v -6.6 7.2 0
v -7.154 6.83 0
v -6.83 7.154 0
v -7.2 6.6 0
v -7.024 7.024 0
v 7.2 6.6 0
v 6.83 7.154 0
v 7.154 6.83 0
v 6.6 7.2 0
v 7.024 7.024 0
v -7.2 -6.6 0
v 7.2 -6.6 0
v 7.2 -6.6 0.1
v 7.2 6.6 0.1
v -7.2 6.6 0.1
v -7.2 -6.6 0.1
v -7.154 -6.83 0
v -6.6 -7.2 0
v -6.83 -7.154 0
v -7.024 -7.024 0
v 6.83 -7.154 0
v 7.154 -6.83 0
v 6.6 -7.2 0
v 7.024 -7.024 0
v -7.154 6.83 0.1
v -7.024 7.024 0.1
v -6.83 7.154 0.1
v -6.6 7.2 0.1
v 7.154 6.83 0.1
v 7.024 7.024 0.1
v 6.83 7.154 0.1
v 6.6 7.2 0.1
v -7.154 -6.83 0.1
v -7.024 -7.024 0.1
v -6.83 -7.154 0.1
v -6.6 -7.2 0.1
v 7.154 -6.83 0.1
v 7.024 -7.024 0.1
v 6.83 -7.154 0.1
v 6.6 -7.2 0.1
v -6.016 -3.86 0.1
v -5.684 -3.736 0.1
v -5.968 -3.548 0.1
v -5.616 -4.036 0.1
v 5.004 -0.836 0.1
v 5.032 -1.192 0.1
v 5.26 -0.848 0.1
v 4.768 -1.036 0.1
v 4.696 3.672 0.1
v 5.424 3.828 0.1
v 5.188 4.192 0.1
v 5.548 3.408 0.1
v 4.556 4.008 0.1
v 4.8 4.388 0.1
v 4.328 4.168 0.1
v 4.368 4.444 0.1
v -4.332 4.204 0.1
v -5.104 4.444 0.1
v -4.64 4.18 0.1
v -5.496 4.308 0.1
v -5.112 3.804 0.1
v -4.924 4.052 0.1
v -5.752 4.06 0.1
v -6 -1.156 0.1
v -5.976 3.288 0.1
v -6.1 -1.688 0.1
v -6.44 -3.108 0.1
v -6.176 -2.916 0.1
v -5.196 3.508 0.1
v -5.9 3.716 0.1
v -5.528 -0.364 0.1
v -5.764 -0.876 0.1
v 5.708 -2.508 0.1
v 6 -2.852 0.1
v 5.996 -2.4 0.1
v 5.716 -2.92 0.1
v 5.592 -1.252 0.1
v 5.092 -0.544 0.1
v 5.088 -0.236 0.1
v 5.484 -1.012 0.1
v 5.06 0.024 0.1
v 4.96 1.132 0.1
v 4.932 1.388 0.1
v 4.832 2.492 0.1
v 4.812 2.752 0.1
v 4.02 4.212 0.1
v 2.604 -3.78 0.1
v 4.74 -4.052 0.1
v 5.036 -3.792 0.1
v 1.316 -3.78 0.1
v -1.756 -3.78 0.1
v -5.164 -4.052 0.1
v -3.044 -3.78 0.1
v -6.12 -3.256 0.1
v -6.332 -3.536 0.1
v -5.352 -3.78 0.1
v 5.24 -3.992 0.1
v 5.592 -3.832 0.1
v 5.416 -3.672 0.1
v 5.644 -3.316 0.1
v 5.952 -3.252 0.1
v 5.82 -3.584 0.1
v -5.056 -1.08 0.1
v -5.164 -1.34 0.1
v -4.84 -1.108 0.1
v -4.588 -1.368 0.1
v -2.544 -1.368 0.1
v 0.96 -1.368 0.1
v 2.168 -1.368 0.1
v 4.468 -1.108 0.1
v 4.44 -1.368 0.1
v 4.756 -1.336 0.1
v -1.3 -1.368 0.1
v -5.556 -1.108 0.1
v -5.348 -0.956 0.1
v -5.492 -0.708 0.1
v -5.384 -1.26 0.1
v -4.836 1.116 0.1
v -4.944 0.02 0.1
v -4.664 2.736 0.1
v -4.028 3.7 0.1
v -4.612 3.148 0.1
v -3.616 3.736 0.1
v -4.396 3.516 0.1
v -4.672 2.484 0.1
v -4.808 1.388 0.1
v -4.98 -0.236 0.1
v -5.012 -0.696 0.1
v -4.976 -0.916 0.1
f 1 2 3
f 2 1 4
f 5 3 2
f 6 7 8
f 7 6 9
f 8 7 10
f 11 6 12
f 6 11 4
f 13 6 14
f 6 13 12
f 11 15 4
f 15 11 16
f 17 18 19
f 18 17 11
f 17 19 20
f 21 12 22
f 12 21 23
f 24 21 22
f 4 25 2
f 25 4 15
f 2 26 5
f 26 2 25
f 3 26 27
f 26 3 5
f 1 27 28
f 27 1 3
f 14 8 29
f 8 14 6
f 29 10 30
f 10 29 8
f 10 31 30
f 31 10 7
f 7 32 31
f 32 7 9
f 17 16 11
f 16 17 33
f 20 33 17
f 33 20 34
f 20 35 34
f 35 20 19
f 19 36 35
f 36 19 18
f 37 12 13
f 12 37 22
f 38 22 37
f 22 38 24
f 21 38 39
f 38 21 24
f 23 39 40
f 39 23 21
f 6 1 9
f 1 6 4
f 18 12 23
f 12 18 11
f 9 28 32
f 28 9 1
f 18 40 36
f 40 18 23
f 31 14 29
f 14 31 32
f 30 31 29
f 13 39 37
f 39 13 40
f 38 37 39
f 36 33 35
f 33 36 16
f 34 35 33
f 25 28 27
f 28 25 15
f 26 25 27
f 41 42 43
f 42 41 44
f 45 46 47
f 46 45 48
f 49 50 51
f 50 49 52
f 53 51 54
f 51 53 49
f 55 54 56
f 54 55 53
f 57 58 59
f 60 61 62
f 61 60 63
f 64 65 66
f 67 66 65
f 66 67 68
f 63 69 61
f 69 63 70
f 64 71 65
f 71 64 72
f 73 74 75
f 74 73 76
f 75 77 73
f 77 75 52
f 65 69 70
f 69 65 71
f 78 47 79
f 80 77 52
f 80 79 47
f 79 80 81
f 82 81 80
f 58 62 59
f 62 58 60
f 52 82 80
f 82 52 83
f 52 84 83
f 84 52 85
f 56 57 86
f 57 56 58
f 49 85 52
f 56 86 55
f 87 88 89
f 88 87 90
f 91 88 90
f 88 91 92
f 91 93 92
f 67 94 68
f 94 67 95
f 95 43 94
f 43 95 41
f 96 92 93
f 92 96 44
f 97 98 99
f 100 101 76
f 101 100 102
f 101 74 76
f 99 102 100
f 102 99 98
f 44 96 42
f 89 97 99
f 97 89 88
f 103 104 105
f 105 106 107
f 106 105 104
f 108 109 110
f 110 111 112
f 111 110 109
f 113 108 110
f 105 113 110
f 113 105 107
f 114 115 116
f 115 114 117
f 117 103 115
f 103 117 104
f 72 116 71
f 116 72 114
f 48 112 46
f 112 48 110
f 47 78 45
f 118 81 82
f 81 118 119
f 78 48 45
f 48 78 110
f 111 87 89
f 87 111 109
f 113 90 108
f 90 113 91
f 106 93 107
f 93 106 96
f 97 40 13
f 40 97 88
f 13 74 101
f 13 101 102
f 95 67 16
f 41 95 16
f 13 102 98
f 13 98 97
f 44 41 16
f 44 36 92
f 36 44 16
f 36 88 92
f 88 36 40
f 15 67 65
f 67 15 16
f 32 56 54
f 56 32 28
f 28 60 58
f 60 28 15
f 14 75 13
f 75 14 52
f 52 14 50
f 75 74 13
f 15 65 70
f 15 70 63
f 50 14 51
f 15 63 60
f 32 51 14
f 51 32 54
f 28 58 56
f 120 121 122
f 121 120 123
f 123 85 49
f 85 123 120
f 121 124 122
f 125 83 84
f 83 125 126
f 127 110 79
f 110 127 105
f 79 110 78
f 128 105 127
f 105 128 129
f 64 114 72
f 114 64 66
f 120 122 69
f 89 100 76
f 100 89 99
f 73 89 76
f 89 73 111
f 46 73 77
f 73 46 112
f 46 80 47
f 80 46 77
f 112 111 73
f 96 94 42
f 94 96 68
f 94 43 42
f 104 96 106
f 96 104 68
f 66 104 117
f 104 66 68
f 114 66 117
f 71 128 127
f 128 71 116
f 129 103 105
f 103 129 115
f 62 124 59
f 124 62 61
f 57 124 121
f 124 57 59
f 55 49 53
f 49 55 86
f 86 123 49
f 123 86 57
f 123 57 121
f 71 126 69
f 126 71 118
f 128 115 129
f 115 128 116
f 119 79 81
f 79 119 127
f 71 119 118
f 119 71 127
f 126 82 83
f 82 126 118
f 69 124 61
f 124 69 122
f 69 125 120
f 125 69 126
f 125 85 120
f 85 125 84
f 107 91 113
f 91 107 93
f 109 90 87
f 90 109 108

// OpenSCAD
// file: ../p/box3u12.scad
use <../lib.scad>
function ldraw_lib__box3u12() = [
// 0 Box with 3 Parallel Faces without Any Edges
// 0 Name: box3u12.dat
// 0 Author: J.C. Tchang [tchang]
// 0 !LDRAW_ORG Primitive UPDATE 2014-02
// 0 !LICENSE Licensed under CC BY 4.0 : see CAreadme.txt
// 
// 0 BFC CERTIFY CCW
  [0,"BFC","CERTIFY"],
  [0,"BFC","CCW"],
// 
// 0 !HISTORY 2014-12-23 [PTadmin] Official Update 2014-02
// 
// 
// 4 16 -1 1 1 1 1 1 1 1 -1 -1 1 -1
  [4,16,-1,1,1,1,1,1,1,1,-1,-1,1,-1],
// 4 16 -1 1 1 -1 0 1 1 0 1 1 1 1
  [4,16,-1,1,1,-1,0,1,1,0,1,1,1,1],
// 4 16 1 1 -1 1 0 -1 -1 0 -1 -1 1 -1
  [4,16,1,1,-1,1,0,-1,-1,0,-1,-1,1,-1],
];
module ldraw_lib__box3u12(step=0, col=false, unit=2/5, alt=false, line=0.2, solid=!$preview)
    makepoly(ldraw_lib__box3u12(), step=step, col=col, unit=unit, alt=alt, line=line, solid=solid);
ldraw_lib__box3u12(line=0.2);
// file: ../p/1-4cyli.scad
use <../lib.scad>
function ldraw_lib__1_4cyli() = [
// 0 Cylinder 0.25
// 0 Name: 1-4cyli.dat
// 0 Author: James Jessiman
// 0 !LDRAW_ORG Primitive UPDATE 2012-01
// 0 !LICENSE Licensed under CC BY 4.0 : see CAreadme.txt
// 
// 0 BFC CERTIFY CCW
  [0,"BFC","CERTIFY"],
  [0,"BFC","CCW"],
// 
// 0 !HISTORY 2002-03-23 [sbliss] Added BFC statement.
// 0 !HISTORY 2002-04-25 [PTadmin] Official Update 2002-02
// 0 !HISTORY 2007-06-22 [PTadmin] Header formatted for Contributor Agreement
// 0 !HISTORY 2008-07-01 [PTadmin] Official Update 2008-01
// 0 !HISTORY 2012-02-16 [Philo] Changed to CCW
// 0 !HISTORY 2012-03-30 [PTadmin] Official Update 2012-01
// 
// 
// 4 16 1 1 0 0.9239 1 0.3827 0.9239 0 0.3827 1 0 0
  [4,16,1,1,0,0.9239,1,0.3827,0.9239,0,0.3827,1,0,0],
// 5 24 1 0 0 1 1 0 0.9239 0 0.3827 1 0 -1
  [5,24,1,0,0,1,1,0,0.9239,0,0.3827,1,0,-1],
// 4 16 0.9239 1 0.3827 0.7071 1 0.7071 0.7071 0 0.7071 0.9239 0 0.3827
  [4,16,0.9239,1,0.3827,0.7071,1,0.7071,0.7071,0,0.7071,0.9239,0,0.3827],
// 5 24 0.9239 0 0.3827 0.9239 1 0.3827 0.7071 0 0.7071 1 0 0
  [5,24,0.9239,0,0.3827,0.9239,1,0.3827,0.7071,0,0.7071,1,0,0],
// 4 16 0.7071 1 0.7071 0.3827 1 0.9239 0.3827 0 0.9239 0.7071 0 0.7071
  [4,16,0.7071,1,0.7071,0.3827,1,0.9239,0.3827,0,0.9239,0.7071,0,0.7071],
// 5 24 0.7071 0 0.7071 0.7071 1 0.7071 0.3827 0 0.9239 0.9239 0 0.3827
  [5,24,0.7071,0,0.7071,0.7071,1,0.7071,0.3827,0,0.9239,0.9239,0,0.3827],
// 4 16 0.3827 1 0.9239 0 1 1 0 0 1 0.3827 0 0.9239
  [4,16,0.3827,1,0.9239,0,1,1,0,0,1,0.3827,0,0.9239],
// 5 24 0.3827 0 0.9239 0.3827 1 0.9239 0 0 1 0.7071 0 0.7071
  [5,24,0.3827,0,0.9239,0.3827,1,0.9239,0,0,1,0.7071,0,0.7071],
// 5 24 0 0 1 0 1 1 0.3827 0 0.9239 -1 0 1
  [5,24,0,0,1,0,1,1,0.3827,0,0.9239,-1,0,1],
];
module ldraw_lib__1_4cyli(step=0, col=false, unit=2/5, alt=false, line=0.2, solid=!$preview)
    makepoly(ldraw_lib__1_4cyli(), step=step, col=col, unit=unit, alt=alt, line=line, solid=solid);
ldraw_lib__1_4cyli(line=0.2);
// file: s/stickerback018x018.scad
use <../../lib.scad>
use <../../p/1-4chrd.scad>
use <../../p/1-4cyli.scad>
use <../../p/box3u12.scad>
function ldraw_lib__s__stickerback018x018() = [
// 0 ~Sticker Back  1.8 x  1.8
// 0 Name: s\stickerback018x018.dat
// 0 Author: Massimo Maso [Sirio]
// 0 !LDRAW_ORG Subpart UPDATE 2025-08
// 0 !LICENSE Licensed under CC BY 4.0 : see CAreadme.txt
// 
// 0 BFC CERTIFY CCW
  [0,"BFC","CERTIFY"],
  [0,"BFC","CCW"],
// 
// 0 !HISTORY 2025-08-31 [OrionP] Official Update 2025-08
// 
// 0 // Primitives
// 1 16 -16.5 0 16.5 -1.5 0 0 0 -1 0 0 0 1.5 1-4chrd.dat
  [1,16,-16.5,0,16.5,-1.5,0,0,0,-1,0,0,0,1.5, ldraw_lib__1_4chrd()],
// 1 16 16.5 0 16.5 1.5 0 0 0 -1 0 0 0 1.5 1-4chrd.dat
  [1,16,16.5,0,16.5,1.5,0,0,0,-1,0,0,0,1.5, ldraw_lib__1_4chrd()],
// 1 16 0 -.25 0 0 0 18 0 .25 0 16.5 0 0 box3u12.dat
  [1,16,0,-.25,0,0,0,18,0,.25,0,16.5,0,0, ldraw_lib__box3u12()],
// 1 16 -16.5 0 -16.5 -1.5 0 0 0 -1 0 0 0 -1.5 1-4chrd.dat
  [1,16,-16.5,0,-16.5,-1.5,0,0,0,-1,0,0,0,-1.5, ldraw_lib__1_4chrd()],
// 1 16 16.5 0 -16.5 1.5 0 0 0 -1 0 0 0 -1.5 1-4chrd.dat
  [1,16,16.5,0,-16.5,1.5,0,0,0,-1,0,0,0,-1.5, ldraw_lib__1_4chrd()],
// 1 16 -16.5 -.25 16.5 -1.5 0 0 0 .25 0 0 0 1.5 1-4cyli.dat
  [1,16,-16.5,-.25,16.5,-1.5,0,0,0,.25,0,0,0,1.5, ldraw_lib__1_4cyli()],
// 1 16 16.5 -.25 16.5 1.5 0 0 0 .25 0 0 0 1.5 1-4cyli.dat
  [1,16,16.5,-.25,16.5,1.5,0,0,0,.25,0,0,0,1.5, ldraw_lib__1_4cyli()],
// 1 16 -16.5 -.25 -16.5 -1.5 0 0 0 .25 0 0 0 -1.5 1-4cyli.dat
  [1,16,-16.5,-.25,-16.5,-1.5,0,0,0,.25,0,0,0,-1.5, ldraw_lib__1_4cyli()],
// 1 16 16.5 -.25 -16.5 1.5 0 0 0 .25 0 0 0 -1.5 1-4cyli.dat
  [1,16,16.5,-.25,-16.5,1.5,0,0,0,.25,0,0,0,-1.5, ldraw_lib__1_4cyli()],
// 0 // Bottom face
// 4 16 -16.5 0 18 16.5 0 18 18 0 16.5 -18 0 16.5
  [4,16,-16.5,0,18,16.5,0,18,18,0,16.5,-18,0,16.5],
// 4 16 -16.5 0 -18 -18 0 -16.5 18 0 -16.5 16.5 0 -18
  [4,16,-16.5,0,-18,-18,0,-16.5,18,0,-16.5,16.5,0,-18],
// 0 // Lateral face
// 4 16 -16.5 -.25 18 16.5 -.25 18 16.5 0 18 -16.5 0 18
  [4,16,-16.5,-.25,18,16.5,-.25,18,16.5,0,18,-16.5,0,18],
// 4 16 16.5 0 -18 16.5 -.25 -18 -16.5 -.25 -18 -16.5 0 -18
  [4,16,16.5,0,-18,16.5,-.25,-18,-16.5,-.25,-18,-16.5,0,-18],
];
module ldraw_lib__s__stickerback018x018(step=0, col=false, unit=2/5, alt=false, line=0.2, solid=!$preview)
    makepoly(ldraw_lib__s__stickerback018x018(), step=step, col=col, unit=unit, alt=alt, line=line, solid=solid);
ldraw_lib__s__stickerback018x018(line=0.2);
// file: ../p/1-4chrd.scad
use <../lib.scad>
function ldraw_lib__1_4chrd() = [
// 0 Chord 0.25
// 0 Name: 1-4chrd.dat
// 0 Author: Max Martin Richter [MMR1988]
// 0 !LDRAW_ORG Primitive UPDATE 2023-05
// 0 !LICENSE Licensed under CC BY 4.0 : see CAreadme.txt
// 
// 0 BFC CERTIFY CCW
  [0,"BFC","CERTIFY"],
  [0,"BFC","CCW"],
// 
// 0 !HISTORY 2004-04-22 [PTadmin] Official Update 2004-02
// 0 !HISTORY 2007-10-09 [PTadmin] Header formatted for Contributor Agreement
// 0 !HISTORY 2008-07-01 [PTadmin] Official Update 2008-01
// 0 !HISTORY 2012-08-02 [MMR1988] Re-creation with PrimGen2 and Rectifier
// 0 !HISTORY 2012-08-09 [PTadmin] Official Update 2012-02
// 0 !HISTORY 2023-10-27 [OrionP] Change author to MMR1988 from hafhead
// 0 !HISTORY 2023-10-31 [OrionP] Official Update 2023-05
// 
// 4 16 0.9239 0 0.3827 0.3827 0 0.9239 0 0 1 1 0 0
  [4,16,0.9239,0,0.3827,0.3827,0,0.9239,0,0,1,1,0,0],
// 3 16 0.7071 0 0.7071 0.3827 0 0.9239 0.9239 0 0.3827
  [3,16,0.7071,0,0.7071,0.3827,0,0.9239,0.9239,0,0.3827],
];
module ldraw_lib__1_4chrd(step=0, col=false, unit=2/5, alt=false, line=0.2, solid=!$preview)
    makepoly(ldraw_lib__1_4chrd(), step=step, col=col, unit=unit, alt=alt, line=line, solid=solid);
ldraw_lib__1_4chrd(line=0.2);
// main file
use <../lib.scad>
use <../p/1-4chrd.scad>
use <s/stickerback018x018.scad>
function ldraw_lib__6531941b() = [
// 0 Sticker  1.8 x  1.8 with Wide Shuttle Bay
// 0 Name: 6531941b.dat
// 0 Author: Philippe Hurbain [Philo]
// 0 !LDRAW_ORG Part UPDATE 2026-07
// 0 !LICENSE Licensed under CC BY 4.0 : see CAreadme.txt
// 
// 0 BFC CERTIFY CCW
  [0,"BFC","CERTIFY"],
  [0,"BFC","CCW"],
// 
// 0 !CATEGORY Sticker
// 0 !KEYWORDS Bricklink 10356stk01a, Brickowl 985574, Rebrickable 10111843
// 0 !KEYWORDS Set 10356, Star Trek, U.S.S. Enterprise NCC-1701-D
// 
// 0 !HISTORY 2026-07-30 [OrionP] Official Update 2026-07
// 
// 1 16 0 0 0 1 0 0 0 1 0 0 0 1 s\stickerback018x018.dat
  [1,16,0,0,0,1,0,0,0,1,0,0,0,1, ldraw_lib__s__stickerback018x018()],
// 1 71 16.5 -.25 16.5 1.5 0 0 0 1 0 0 0 1.5 1-4chrd.dat
  [1,71,16.5,-.25,16.5,1.5,0,0,0,1,0,0,0,1.5, ldraw_lib__1_4chrd()],
// 1 71 16.5 -.25 -16.5 0 0 1.5 0 1 0 -1.5 0 0 1-4chrd.dat
  [1,71,16.5,-.25,-16.5,0,0,1.5,0,1,0,-1.5,0,0, ldraw_lib__1_4chrd()],
// 1 71 -16.5 -.25 -16.5 -1.5 0 0 0 1 0 0 0 -1.5 1-4chrd.dat
  [1,71,-16.5,-.25,-16.5,-1.5,0,0,0,1,0,0,0,-1.5, ldraw_lib__1_4chrd()],
// 1 71 -16.5 -.25 16.5 0 0 -1.5 0 1 0 1.5 0 0 1-4chrd.dat
  [1,71,-16.5,-.25,16.5,0,0,-1.5,0,1,0,1.5,0,0, ldraw_lib__1_4chrd()],
// 
// 4 0 -14.04 -.25 -10.09 -14.21 -.25 -9.34 -14.92 -.25 -8.87 -15.04 -.25 -9.65
  [4,0,-14.04,-.25,-10.09,-14.21,-.25,-9.34,-14.92,-.25,-8.87,-15.04,-.25,-9.65],
// 4 0 13.15 -.25 -2.12 12.51 -.25 -2.09 11.92 -.25 -2.59 12.58 -.25 -2.98
  [4,0,13.15,-.25,-2.12,12.51,-.25,-2.09,11.92,-.25,-2.59,12.58,-.25,-2.98],
// 4 0 13.87 -.25 8.52 13.56 -.25 9.57 12.97 -.25 10.48 11.74 -.25 9.18
  [4,0,13.87,-.25,8.52,13.56,-.25,9.57,12.97,-.25,10.48,11.74,-.25,9.18],
// 4 0 11.74 -.25 9.18 12.97 -.25 10.48 12 -.25 10.97 11.39 -.25 10.02
  [4,0,11.74,-.25,9.18,12.97,-.25,10.48,12,-.25,10.97,11.39,-.25,10.02],
// 4 0 10.92 -.25 11.11 10.82 -.25 10.42 11.39 -.25 10.02 12 -.25 10.97
  [4,0,10.92,-.25,11.11,10.82,-.25,10.42,11.39,-.25,10.02,12,-.25,10.97],
// 3 0 -10.83 -.25 10.51 -12.76 -.25 11.11 -11.6 -.25 10.45
  [3,0,-10.83,-.25,10.51,-12.76,-.25,11.11,-11.6,-.25,10.45],
// 4 0 -12.31 -.25 10.13 -13.74 -.25 10.77 -14.38 -.25 10.15 -12.78 -.25 9.51
  [4,0,-12.31,-.25,10.13,-13.74,-.25,10.77,-14.38,-.25,10.15,-12.78,-.25,9.51],
// 3 0 -15 -.25 -2.89 -14.94 -.25 8.22 -15.25 -.25 -4.22
  [3,0,-15,-.25,-2.89,-14.94,-.25,8.22,-15.25,-.25,-4.22],
// 4 0 -14.94 -.25 8.22 -16.1 -.25 -7.77 -15.44 -.25 -7.29 -15.25 -.25 -4.22
  [4,0,-14.94,-.25,8.22,-16.1,-.25,-7.77,-15.44,-.25,-7.29,-15.25,-.25,-4.22],
// 4 0 -14.75 -.25 9.29 -12.99 -.25 8.77 -12.78 -.25 9.51 -14.38 -.25 10.15
  [4,0,-14.75,-.25,9.29,-12.99,-.25,8.77,-12.78,-.25,9.51,-14.38,-.25,10.15],
// 4 0 -14.41 -.25 -2.19 -13.82 -.25 -.91 -14.94 -.25 8.22 -15 -.25 -2.89
  [4,0,-14.41,-.25,-2.19,-13.82,-.25,-.91,-14.94,-.25,8.22,-15,-.25,-2.89],
// 4 0 14.99 -.25 -6 14.27 -.25 -6.27 14.29 -.25 -7.3 15 -.25 -7.13
  [4,0,14.99,-.25,-6,14.27,-.25,-6.27,14.29,-.25,-7.3,15,-.25,-7.13],
// 4 0 13.87 -.25 8.52 13.98 -.25 -3.13 14.27 -.25 -6.27 14.99 -.25 -6
  [4,0,13.87,-.25,8.52,13.98,-.25,-3.13,14.27,-.25,-6.27,14.99,-.25,-6],
// 4 0 -14.75 -.25 9.29 -14.94 -.25 8.22 -13.82 -.25 -.91 -12.99 -.25 8.77
  [4,0,-14.75,-.25,9.29,-14.94,-.25,8.22,-13.82,-.25,-.91,-12.99,-.25,8.77],
// 3 0 12.73 -.25 -1.36 13.15 -.25 -2.12 12.72 -.25 -.59
  [3,0,12.73,-.25,-1.36,13.15,-.25,-2.12,12.72,-.25,-.59],
// 3 0 13.71 -.25 -2.53 13.98 -.25 -3.13 13.87 -.25 8.52
  [3,0,13.71,-.25,-2.53,13.98,-.25,-3.13,13.87,-.25,8.52],
// 4 0 13.15 -.25 -2.12 13.71 -.25 -2.53 12.65 -.25 .06 12.72 -.25 -.59
  [4,0,13.15,-.25,-2.12,13.71,-.25,-2.53,12.65,-.25,.06,12.72,-.25,-.59],
// 3 0 12.4 -.25 2.83 12.65 -.25 .06 13.71 -.25 -2.53
  [3,0,12.4,-.25,2.83,12.65,-.25,.06,13.71,-.25,-2.53],
// 4 0 -13.74 -.25 10.77 -12.31 -.25 10.13 -11.6 -.25 10.45 -12.76 -.25 11.11
  [4,0,-13.74,-.25,10.77,-12.31,-.25,10.13,-11.6,-.25,10.45,-12.76,-.25,11.11],
// 4 0 13.71 -.25 -2.53 13.87 -.25 8.52 12.33 -.25 3.47 12.4 -.25 2.83
  [4,0,13.71,-.25,-2.53,13.87,-.25,8.52,12.33,-.25,3.47,12.4,-.25,2.83],
// 4 0 12.33 -.25 3.47 13.87 -.25 8.52 12.03 -.25 6.88 12.08 -.25 6.23
  [4,0,12.33,-.25,3.47,13.87,-.25,8.52,12.03,-.25,6.88,12.08,-.25,6.23],
// 4 0 -12.76 -.25 11.11 -10.83 -.25 10.51 10.05 -.25 10.53 10.92 -.25 11.11
  [4,0,-12.76,-.25,11.11,-10.83,-.25,10.51,10.05,-.25,10.53,10.92,-.25,11.11],
// 3 0 11.74 -.25 9.18 12.03 -.25 6.88 13.87 -.25 8.52
  [3,0,11.74,-.25,9.18,12.03,-.25,6.88,13.87,-.25,8.52],
// 3 0 10.92 -.25 11.11 10.05 -.25 10.53 10.82 -.25 10.42
  [3,0,10.92,-.25,11.11,10.05,-.25,10.53,10.82,-.25,10.42],
// 4 0 3.29 -.25 -9.45 11.85 -.25 -10.13 12.59 -.25 -9.48 6.51 -.25 -9.45
  [4,0,3.29,-.25,-9.45,11.85,-.25,-10.13,12.59,-.25,-9.48,6.51,-.25,-9.45],
// 4 0 11.85 -.25 -10.13 3.29 -.25 -9.45 -4.39 -.25 -9.45 -12.91 -.25 -10.13
  [4,0,11.85,-.25,-10.13,3.29,-.25,-9.45,-4.39,-.25,-9.45,-12.91,-.25,-10.13],
// 3 0 -4.39 -.25 -9.45 -7.61 -.25 -9.45 -12.91 -.25 -10.13
  [3,0,-4.39,-.25,-9.45,-7.61,-.25,-9.45,-12.91,-.25,-10.13],
// 4 0 -15.83 -.25 -8.84 -15.3 -.25 -8.14 -15.44 -.25 -7.29 -16.1 -.25 -7.77
  [4,0,-15.83,-.25,-8.84,-15.3,-.25,-8.14,-15.44,-.25,-7.29,-16.1,-.25,-7.77],
// 4 0 -15.04 -.25 -9.65 -14.92 -.25 -8.87 -15.3 -.25 -8.14 -15.83 -.25 -8.84
  [4,0,-15.04,-.25,-9.65,-14.92,-.25,-8.87,-15.3,-.25,-8.14,-15.83,-.25,-8.84],
// 4 0 -7.61 -.25 -9.45 -13.38 -.25 -9.45 -14.04 -.25 -10.09 -12.91 -.25 -10.13
  [4,0,-7.61,-.25,-9.45,-13.38,-.25,-9.45,-14.04,-.25,-10.09,-12.91,-.25,-10.13],
// 3 0 13.1 -.25 -9.98 13.98 -.25 -9.58 13.54 -.25 -9.18
  [3,0,13.1,-.25,-9.98,13.98,-.25,-9.58,13.54,-.25,-9.18],
// 4 0 14.29 -.25 -7.3 14.11 -.25 -8.29 14.55 -.25 -8.96 14.88 -.25 -8.13
  [4,0,14.29,-.25,-7.3,14.11,-.25,-8.29,14.55,-.25,-8.96,14.88,-.25,-8.13],
// 3 0 14.88 -.25 -8.13 15 -.25 -7.13 14.29 -.25 -7.3
  [3,0,14.88,-.25,-8.13,15,-.25,-7.13,14.29,-.25,-7.3],
// 4 0 13.98 -.25 -9.58 14.55 -.25 -8.96 14.11 -.25 -8.29 13.54 -.25 -9.18
  [4,0,13.98,-.25,-9.58,14.55,-.25,-8.96,14.11,-.25,-8.29,13.54,-.25,-9.18],
// 3 0 -14.04 -.25 -10.09 -13.38 -.25 -9.45 -14.21 -.25 -9.34
  [3,0,-14.04,-.25,-10.09,-13.38,-.25,-9.45,-14.21,-.25,-9.34],
// 4 0 11.85 -.25 -10.13 13.1 -.25 -9.98 13.54 -.25 -9.18 12.59 -.25 -9.48
  [4,0,11.85,-.25,-10.13,13.1,-.25,-9.98,13.54,-.25,-9.18,12.59,-.25,-9.48],
// 3 0 -12.64 -.25 -2.7 -12.91 -.25 -3.35 -12.1 -.25 -2.77
  [3,0,-12.64,-.25,-2.7,-12.91,-.25,-3.35,-12.1,-.25,-2.77],
// 4 0 -12.91 -.25 -3.35 -11.47 -.25 -3.42 -6.36 -.25 -3.42 -12.1 -.25 -2.77
  [4,0,-12.91,-.25,-3.35,-11.47,-.25,-3.42,-6.36,-.25,-3.42,-12.1,-.25,-2.77],
// 3 0 2.4 -.25 -3.42 5.42 -.25 -3.42 11.17 -.25 -2.77
  [3,0,2.4,-.25,-3.42,5.42,-.25,-3.42,11.17,-.25,-2.77],
// 4 0 11.89 -.25 -3.34 11.17 -.25 -2.77 5.42 -.25 -3.42 11.1 -.25 -3.42
  [4,0,11.89,-.25,-3.34,11.17,-.25,-2.77,5.42,-.25,-3.42,11.1,-.25,-3.42],
// 3 0 -3.25 -.25 -3.42 2.4 -.25 -3.42 11.17 -.25 -2.77
  [3,0,-3.25,-.25,-3.42,2.4,-.25,-3.42,11.17,-.25,-2.77],
// 4 0 -6.36 -.25 -3.42 -3.25 -.25 -3.42 11.17 -.25 -2.77 -12.1 -.25 -2.77
  [4,0,-6.36,-.25,-3.42,-3.25,-.25,-3.42,11.17,-.25,-2.77,-12.1,-.25,-2.77],
// 4 0 -13.46 -.25 -3.15 -13.37 -.25 -2.39 -13.73 -.25 -1.77 -13.89 -.25 -2.77
  [4,0,-13.46,-.25,-3.15,-13.37,-.25,-2.39,-13.73,-.25,-1.77,-13.89,-.25,-2.77],
// 4 0 -12.91 -.25 -3.35 -12.64 -.25 -2.7 -13.37 -.25 -2.39 -13.46 -.25 -3.15
  [4,0,-12.91,-.25,-3.35,-12.64,-.25,-2.7,-13.37,-.25,-2.39,-13.46,-.25,-3.15],
// 4 0 -13.89 -.25 -2.77 -13.73 -.25 -1.77 -13.82 -.25 -.91 -14.41 -.25 -2.19
  [4,0,-13.89,-.25,-2.77,-13.73,-.25,-1.77,-13.82,-.25,-.91,-14.41,-.25,-2.19],
// 4 0 12.58 -.25 -2.98 11.92 -.25 -2.59 11.17 -.25 -2.77 11.89 -.25 -3.34
  [4,0,12.58,-.25,-2.98,11.92,-.25,-2.59,11.17,-.25,-2.77,11.89,-.25,-3.34],
// 3 0 13.15 -.25 -2.12 12.73 -.25 -1.36 12.51 -.25 -2.09
  [3,0,13.15,-.25,-2.12,12.73,-.25,-1.36,12.51,-.25,-2.09],
// 4 71 -12.36 -.25 .05 12.65 -.25 .06 12.4 -.25 2.83 -12.09 -.25 2.79
  [4,71,-12.36,-.25,.05,12.65,-.25,.06,12.4,-.25,2.83,-12.09,-.25,2.79],
// 4 71 11.17 -.25 -2.77 11.92 -.25 -2.59 12.51 -.25 -2.09 12.73 -.25 -1.36
  [4,71,11.17,-.25,-2.77,11.92,-.25,-2.59,12.51,-.25,-2.09,12.73,-.25,-1.36],
// 4 71 12.59 -.25 -9.48 11.1 -.25 -3.42 5.42 -.25 -3.42 6.51 -.25 -9.45
  [4,71,12.59,-.25,-9.48,11.1,-.25,-3.42,5.42,-.25,-3.42,6.51,-.25,-9.45],
// 4 71 -4.39 -.25 -9.45 3.29 -.25 -9.45 2.4 -.25 -3.42 -3.25 -.25 -3.42
  [4,71,-4.39,-.25,-9.45,3.29,-.25,-9.45,2.4,-.25,-3.42,-3.25,-.25,-3.42],
// 4 71 -13.38 -.25 -9.45 -7.61 -.25 -9.45 -6.36 -.25 -3.42 -11.47 -.25 -3.42
  [4,71,-13.38,-.25,-9.45,-7.61,-.25,-9.45,-6.36,-.25,-3.42,-11.47,-.25,-3.42],
// 4 71 11.85 -.25 -10.13 16.5 -.25 -18 18 -.25 -16.5 13.1 -.25 -9.98
  [4,71,11.85,-.25,-10.13,16.5,-.25,-18,18,-.25,-16.5,13.1,-.25,-9.98],
// 3 71 18 -.25 -16.5 15 -.25 -7.13 14.88 -.25 -8.13
  [3,71,18,-.25,-16.5,15,-.25,-7.13,14.88,-.25,-8.13],
// 3 71 18 -.25 -16.5 14.88 -.25 -8.13 14.55 -.25 -8.96
  [3,71,18,-.25,-16.5,14.88,-.25,-8.13,14.55,-.25,-8.96],
// 3 71 -15.83 -.25 -8.84 -16.1 -.25 -7.77 -18 -.25 -16.5
  [3,71,-15.83,-.25,-8.84,-16.1,-.25,-7.77,-18,-.25,-16.5],
// 3 71 -15.04 -.25 -9.65 -15.83 -.25 -8.84 -18 -.25 -16.5
  [3,71,-15.04,-.25,-9.65,-15.83,-.25,-8.84,-18,-.25,-16.5],
// 3 71 18 -.25 -16.5 14.55 -.25 -8.96 13.98 -.25 -9.58
  [3,71,18,-.25,-16.5,14.55,-.25,-8.96,13.98,-.25,-9.58],
// 3 71 18 -.25 -16.5 13.98 -.25 -9.58 13.1 -.25 -9.98
  [3,71,18,-.25,-16.5,13.98,-.25,-9.58,13.1,-.25,-9.98],
// 3 71 -14.04 -.25 -10.09 -15.04 -.25 -9.65 -18 -.25 -16.5
  [3,71,-14.04,-.25,-10.09,-15.04,-.25,-9.65,-18,-.25,-16.5],
// 4 71 -18 -.25 -16.5 -16.5 -.25 -18 -12.91 -.25 -10.13 -14.04 -.25 -10.09
  [4,71,-18,-.25,-16.5,-16.5,-.25,-18,-12.91,-.25,-10.13,-14.04,-.25,-10.09],
// 4 71 16.5 -.25 -18 11.85 -.25 -10.13 -12.91 -.25 -10.13 -16.5 -.25 -18
  [4,71,16.5,-.25,-18,11.85,-.25,-10.13,-12.91,-.25,-10.13,-16.5,-.25,-18],
// 4 71 -18 -.25 -16.5 -16.1 -.25 -7.77 -14.94 -.25 8.22 -18 -.25 16.5
  [4,71,-18,-.25,-16.5,-16.1,-.25,-7.77,-14.94,-.25,8.22,-18,-.25,16.5],
// 4 71 12 -.25 10.97 16.5 -.25 18 -16.5 -.25 18 10.92 -.25 11.11
  [4,71,12,-.25,10.97,16.5,-.25,18,-16.5,-.25,18,10.92,-.25,11.11],
// 4 71 -18 -.25 16.5 -13.74 -.25 10.77 -12.76 -.25 11.11 -16.5 -.25 18
  [4,71,-18,-.25,16.5,-13.74,-.25,10.77,-12.76,-.25,11.11,-16.5,-.25,18],
// 4 71 13.87 -.25 8.52 14.99 -.25 -6 18 -.25 -16.5 18 -.25 16.5
  [4,71,13.87,-.25,8.52,14.99,-.25,-6,18,-.25,-16.5,18,-.25,16.5],
// 3 71 13.87 -.25 8.52 18 -.25 16.5 13.56 -.25 9.57
  [3,71,13.87,-.25,8.52,18,-.25,16.5,13.56,-.25,9.57],
// 3 71 14.99 -.25 -6 15 -.25 -7.13 18 -.25 -16.5
  [3,71,14.99,-.25,-6,15,-.25,-7.13,18,-.25,-16.5],
// 3 71 -18 -.25 16.5 -14.94 -.25 8.22 -14.75 -.25 9.29
  [3,71,-18,-.25,16.5,-14.94,-.25,8.22,-14.75,-.25,9.29],
// 3 71 -18 -.25 16.5 -14.75 -.25 9.29 -14.38 -.25 10.15
  [3,71,-18,-.25,16.5,-14.75,-.25,9.29,-14.38,-.25,10.15],
// 3 71 13.56 -.25 9.57 18 -.25 16.5 12.97 -.25 10.48
  [3,71,13.56,-.25,9.57,18,-.25,16.5,12.97,-.25,10.48],
// 3 71 -18 -.25 16.5 -14.38 -.25 10.15 -13.74 -.25 10.77
  [3,71,-18,-.25,16.5,-14.38,-.25,10.15,-13.74,-.25,10.77],
// 4 71 18 -.25 16.5 16.5 -.25 18 12 -.25 10.97 12.97 -.25 10.48
  [4,71,18,-.25,16.5,16.5,-.25,18,12,-.25,10.97,12.97,-.25,10.48],
// 3 71 -16.5 -.25 18 -12.76 -.25 11.11 10.92 -.25 11.11
  [3,71,-16.5,-.25,18,-12.76,-.25,11.11,10.92,-.25,11.11],
// 4 71 -11.53 -.25 7.87 -11.66 -.25 6.84 -9.04 -.25 9.34 -10.07 -.25 9.25
  [4,71,-11.53,-.25,7.87,-11.66,-.25,6.84,-9.04,-.25,9.34,-10.07,-.25,9.25],
// 4 71 11.74 -.25 9.18 -9.04 -.25 9.34 -11.66 -.25 6.84 12.03 -.25 6.88
  [4,71,11.74,-.25,9.18,-9.04,-.25,9.34,-11.66,-.25,6.84,12.03,-.25,6.88],
// 3 71 -10.07 -.25 9.25 -10.99 -.25 8.79 -11.53 -.25 7.87
  [3,71,-10.07,-.25,9.25,-10.99,-.25,8.79,-11.53,-.25,7.87],
// 4 71 12.08 -.25 6.23 -11.68 -.25 6.21 -12.02 -.25 3.47 12.33 -.25 3.47
  [4,71,12.08,-.25,6.23,-11.68,-.25,6.21,-12.02,-.25,3.47,12.33,-.25,3.47],
// 4 71 -12.1 -.25 -2.77 11.17 -.25 -2.77 12.72 -.25 -.59 -12.45 -.25 -.59
  [4,71,-12.1,-.25,-2.77,11.17,-.25,-2.77,12.72,-.25,-.59,-12.45,-.25,-.59],
// 3 71 12.72 -.25 -.59 11.17 -.25 -2.77 12.73 -.25 -1.36
  [3,71,12.72,-.25,-.59,11.17,-.25,-2.77,12.73,-.25,-1.36],
// 4 71 -12.45 -.25 -.59 -12.53 -.25 -1.74 -12.44 -.25 -2.29 -12.1 -.25 -2.77
  [4,71,-12.45,-.25,-.59,-12.53,-.25,-1.74,-12.44,-.25,-2.29,-12.1,-.25,-2.77],
// 4 72 -15.25 -.25 -4.22 -13.89 -.25 -2.77 -14.41 -.25 -2.19 -15 -.25 -2.89
  [4,72,-15.25,-.25,-4.22,-13.89,-.25,-2.77,-14.41,-.25,-2.19,-15,-.25,-2.89],
// 3 72 -11.66 -.25 6.84 -11.53 -.25 7.87 -12.99 -.25 8.77
  [3,72,-11.66,-.25,6.84,-11.53,-.25,7.87,-12.99,-.25,8.77],
// 4 72 13.54 -.25 -9.18 14.11 -.25 -8.29 14.29 -.25 -7.3 12.59 -.25 -9.48
  [4,72,13.54,-.25,-9.18,14.11,-.25,-8.29,14.29,-.25,-7.3,12.59,-.25,-9.48],
// 4 72 11.1 -.25 -3.42 12.59 -.25 -9.48 14.29 -.25 -7.3 14.27 -.25 -6.27
  [4,72,11.1,-.25,-3.42,12.59,-.25,-9.48,14.29,-.25,-7.3,14.27,-.25,-6.27],
// 4 72 11.89 -.25 -3.34 14.27 -.25 -6.27 13.98 -.25 -3.13 12.58 -.25 -2.98
  [4,72,11.89,-.25,-3.34,14.27,-.25,-6.27,13.98,-.25,-3.13,12.58,-.25,-2.98],
// 4 72 13.15 -.25 -2.12 12.58 -.25 -2.98 13.98 -.25 -3.13 13.71 -.25 -2.53
  [4,72,13.15,-.25,-2.12,12.58,-.25,-2.98,13.98,-.25,-3.13,13.71,-.25,-2.53],
// 3 72 11.89 -.25 -3.34 11.1 -.25 -3.42 14.27 -.25 -6.27
  [3,72,11.89,-.25,-3.34,11.1,-.25,-3.42,14.27,-.25,-6.27],
// 4 72 -14.21 -.25 -9.34 -13.38 -.25 -9.45 -15.44 -.25 -7.29 -15.3 -.25 -8.14
  [4,72,-14.21,-.25,-9.34,-13.38,-.25,-9.45,-15.44,-.25,-7.29,-15.3,-.25,-8.14],
// 3 72 -15.3 -.25 -8.14 -14.92 -.25 -8.87 -14.21 -.25 -9.34
  [3,72,-15.3,-.25,-8.14,-14.92,-.25,-8.87,-14.21,-.25,-9.34],
// 4 72 -11.47 -.25 -3.42 -12.91 -.25 -3.35 -15.44 -.25 -7.29 -13.38 -.25 -9.45
  [4,72,-11.47,-.25,-3.42,-12.91,-.25,-3.35,-15.44,-.25,-7.29,-13.38,-.25,-9.45],
// 4 72 -13.46 -.25 -3.15 -15.25 -.25 -4.22 -15.44 -.25 -7.29 -12.91 -.25 -3.35
  [4,72,-13.46,-.25,-3.15,-15.25,-.25,-4.22,-15.44,-.25,-7.29,-12.91,-.25,-3.35],
// 3 72 -13.89 -.25 -2.77 -15.25 -.25 -4.22 -13.46 -.25 -3.15
  [3,72,-13.89,-.25,-2.77,-15.25,-.25,-4.22,-13.46,-.25,-3.15],
// 4 72 -12.45 -.25 -.59 -13.82 -.25 -.91 -13.73 -.25 -1.77 -12.53 -.25 -1.74
  [4,72,-12.45,-.25,-.59,-13.82,-.25,-.91,-13.73,-.25,-1.77,-12.53,-.25,-1.74],
// 4 72 -12.1 -.25 -2.77 -12.44 -.25 -2.29 -13.37 -.25 -2.39 -12.64 -.25 -2.7
  [4,72,-12.1,-.25,-2.77,-12.44,-.25,-2.29,-13.37,-.25,-2.39,-12.64,-.25,-2.7],
// 4 72 -11.6 -.25 10.45 -12.31 -.25 10.13 -12.78 -.25 9.51 -10.99 -.25 8.79
  [4,72,-11.6,-.25,10.45,-12.31,-.25,10.13,-12.78,-.25,9.51,-10.99,-.25,8.79],
// 4 72 -10.07 -.25 9.25 -10.83 -.25 10.51 -11.6 -.25 10.45 -10.99 -.25 8.79
  [4,72,-10.07,-.25,9.25,-10.83,-.25,10.51,-11.6,-.25,10.45,-10.99,-.25,8.79],
// 4 72 10.05 -.25 10.53 11.74 -.25 9.18 11.39 -.25 10.02 10.82 -.25 10.42
  [4,72,10.05,-.25,10.53,11.74,-.25,9.18,11.39,-.25,10.02,10.82,-.25,10.42],
// 4 72 -10.83 -.25 10.51 -9.04 -.25 9.34 11.74 -.25 9.18 10.05 -.25 10.53
  [4,72,-10.83,-.25,10.51,-9.04,-.25,9.34,11.74,-.25,9.18,10.05,-.25,10.53],
// 3 72 -9.04 -.25 9.34 -10.83 -.25 10.51 -10.07 -.25 9.25
  [3,72,-9.04,-.25,9.34,-10.83,-.25,10.51,-10.07,-.25,9.25],
// 4 72 -12.99 -.25 8.77 -13.82 -.25 -.91 -12.09 -.25 2.79 -12.02 -.25 3.47
  [4,72,-12.99,-.25,8.77,-13.82,-.25,-.91,-12.09,-.25,2.79,-12.02,-.25,3.47],
// 4 72 -13.73 -.25 -1.77 -13.37 -.25 -2.39 -12.44 -.25 -2.29 -12.53 -.25 -1.74
  [4,72,-13.73,-.25,-1.77,-13.37,-.25,-2.39,-12.44,-.25,-2.29,-12.53,-.25,-1.74],
// 4 72 12.65 -.25 .06 -12.36 -.25 .05 -12.45 -.25 -.59 12.72 -.25 -.59
  [4,72,12.65,-.25,.06,-12.36,-.25,.05,-12.45,-.25,-.59,12.72,-.25,-.59],
// 4 72 -12.09 -.25 2.79 -13.82 -.25 -.91 -12.45 -.25 -.59 -12.36 -.25 .05
  [4,72,-12.09,-.25,2.79,-13.82,-.25,-.91,-12.45,-.25,-.59,-12.36,-.25,.05],
// 4 72 -12.09 -.25 2.79 12.4 -.25 2.83 12.33 -.25 3.47 -12.02 -.25 3.47
  [4,72,-12.09,-.25,2.79,12.4,-.25,2.83,12.33,-.25,3.47,-12.02,-.25,3.47],
// 4 72 -12.78 -.25 9.51 -12.99 -.25 8.77 -11.53 -.25 7.87 -10.99 -.25 8.79
  [4,72,-12.78,-.25,9.51,-12.99,-.25,8.77,-11.53,-.25,7.87,-10.99,-.25,8.79],
// 4 72 -11.66 -.25 6.84 -12.99 -.25 8.77 -12.02 -.25 3.47 -11.68 -.25 6.21
  [4,72,-11.66,-.25,6.84,-12.99,-.25,8.77,-12.02,-.25,3.47,-11.68,-.25,6.21],
// 4 72 12.08 -.25 6.23 12.03 -.25 6.88 -11.66 -.25 6.84 -11.68 -.25 6.21
  [4,72,12.08,-.25,6.23,12.03,-.25,6.88,-11.66,-.25,6.84,-11.68,-.25,6.21],
// 4 484 -7.61 -.25 -9.45 -4.39 -.25 -9.45 -3.25 -.25 -3.42 -6.36 -.25 -3.42
  [4,484,-7.61,-.25,-9.45,-4.39,-.25,-9.45,-3.25,-.25,-3.42,-6.36,-.25,-3.42],
// 4 484 6.51 -.25 -9.45 5.42 -.25 -3.42 2.4 -.25 -3.42 3.29 -.25 -9.45
  [4,484,6.51,-.25,-9.45,5.42,-.25,-3.42,2.4,-.25,-3.42,3.29,-.25,-9.45],
];
module ldraw_lib__6531941b(step=0, col=false, unit=2/5, alt=false, line=0.2, solid=!$preview)
    makepoly(ldraw_lib__6531941b(), step=step, col=col, unit=unit, alt=alt, line=line, solid=solid);
ldraw_lib__6531941b(line=0.2);
